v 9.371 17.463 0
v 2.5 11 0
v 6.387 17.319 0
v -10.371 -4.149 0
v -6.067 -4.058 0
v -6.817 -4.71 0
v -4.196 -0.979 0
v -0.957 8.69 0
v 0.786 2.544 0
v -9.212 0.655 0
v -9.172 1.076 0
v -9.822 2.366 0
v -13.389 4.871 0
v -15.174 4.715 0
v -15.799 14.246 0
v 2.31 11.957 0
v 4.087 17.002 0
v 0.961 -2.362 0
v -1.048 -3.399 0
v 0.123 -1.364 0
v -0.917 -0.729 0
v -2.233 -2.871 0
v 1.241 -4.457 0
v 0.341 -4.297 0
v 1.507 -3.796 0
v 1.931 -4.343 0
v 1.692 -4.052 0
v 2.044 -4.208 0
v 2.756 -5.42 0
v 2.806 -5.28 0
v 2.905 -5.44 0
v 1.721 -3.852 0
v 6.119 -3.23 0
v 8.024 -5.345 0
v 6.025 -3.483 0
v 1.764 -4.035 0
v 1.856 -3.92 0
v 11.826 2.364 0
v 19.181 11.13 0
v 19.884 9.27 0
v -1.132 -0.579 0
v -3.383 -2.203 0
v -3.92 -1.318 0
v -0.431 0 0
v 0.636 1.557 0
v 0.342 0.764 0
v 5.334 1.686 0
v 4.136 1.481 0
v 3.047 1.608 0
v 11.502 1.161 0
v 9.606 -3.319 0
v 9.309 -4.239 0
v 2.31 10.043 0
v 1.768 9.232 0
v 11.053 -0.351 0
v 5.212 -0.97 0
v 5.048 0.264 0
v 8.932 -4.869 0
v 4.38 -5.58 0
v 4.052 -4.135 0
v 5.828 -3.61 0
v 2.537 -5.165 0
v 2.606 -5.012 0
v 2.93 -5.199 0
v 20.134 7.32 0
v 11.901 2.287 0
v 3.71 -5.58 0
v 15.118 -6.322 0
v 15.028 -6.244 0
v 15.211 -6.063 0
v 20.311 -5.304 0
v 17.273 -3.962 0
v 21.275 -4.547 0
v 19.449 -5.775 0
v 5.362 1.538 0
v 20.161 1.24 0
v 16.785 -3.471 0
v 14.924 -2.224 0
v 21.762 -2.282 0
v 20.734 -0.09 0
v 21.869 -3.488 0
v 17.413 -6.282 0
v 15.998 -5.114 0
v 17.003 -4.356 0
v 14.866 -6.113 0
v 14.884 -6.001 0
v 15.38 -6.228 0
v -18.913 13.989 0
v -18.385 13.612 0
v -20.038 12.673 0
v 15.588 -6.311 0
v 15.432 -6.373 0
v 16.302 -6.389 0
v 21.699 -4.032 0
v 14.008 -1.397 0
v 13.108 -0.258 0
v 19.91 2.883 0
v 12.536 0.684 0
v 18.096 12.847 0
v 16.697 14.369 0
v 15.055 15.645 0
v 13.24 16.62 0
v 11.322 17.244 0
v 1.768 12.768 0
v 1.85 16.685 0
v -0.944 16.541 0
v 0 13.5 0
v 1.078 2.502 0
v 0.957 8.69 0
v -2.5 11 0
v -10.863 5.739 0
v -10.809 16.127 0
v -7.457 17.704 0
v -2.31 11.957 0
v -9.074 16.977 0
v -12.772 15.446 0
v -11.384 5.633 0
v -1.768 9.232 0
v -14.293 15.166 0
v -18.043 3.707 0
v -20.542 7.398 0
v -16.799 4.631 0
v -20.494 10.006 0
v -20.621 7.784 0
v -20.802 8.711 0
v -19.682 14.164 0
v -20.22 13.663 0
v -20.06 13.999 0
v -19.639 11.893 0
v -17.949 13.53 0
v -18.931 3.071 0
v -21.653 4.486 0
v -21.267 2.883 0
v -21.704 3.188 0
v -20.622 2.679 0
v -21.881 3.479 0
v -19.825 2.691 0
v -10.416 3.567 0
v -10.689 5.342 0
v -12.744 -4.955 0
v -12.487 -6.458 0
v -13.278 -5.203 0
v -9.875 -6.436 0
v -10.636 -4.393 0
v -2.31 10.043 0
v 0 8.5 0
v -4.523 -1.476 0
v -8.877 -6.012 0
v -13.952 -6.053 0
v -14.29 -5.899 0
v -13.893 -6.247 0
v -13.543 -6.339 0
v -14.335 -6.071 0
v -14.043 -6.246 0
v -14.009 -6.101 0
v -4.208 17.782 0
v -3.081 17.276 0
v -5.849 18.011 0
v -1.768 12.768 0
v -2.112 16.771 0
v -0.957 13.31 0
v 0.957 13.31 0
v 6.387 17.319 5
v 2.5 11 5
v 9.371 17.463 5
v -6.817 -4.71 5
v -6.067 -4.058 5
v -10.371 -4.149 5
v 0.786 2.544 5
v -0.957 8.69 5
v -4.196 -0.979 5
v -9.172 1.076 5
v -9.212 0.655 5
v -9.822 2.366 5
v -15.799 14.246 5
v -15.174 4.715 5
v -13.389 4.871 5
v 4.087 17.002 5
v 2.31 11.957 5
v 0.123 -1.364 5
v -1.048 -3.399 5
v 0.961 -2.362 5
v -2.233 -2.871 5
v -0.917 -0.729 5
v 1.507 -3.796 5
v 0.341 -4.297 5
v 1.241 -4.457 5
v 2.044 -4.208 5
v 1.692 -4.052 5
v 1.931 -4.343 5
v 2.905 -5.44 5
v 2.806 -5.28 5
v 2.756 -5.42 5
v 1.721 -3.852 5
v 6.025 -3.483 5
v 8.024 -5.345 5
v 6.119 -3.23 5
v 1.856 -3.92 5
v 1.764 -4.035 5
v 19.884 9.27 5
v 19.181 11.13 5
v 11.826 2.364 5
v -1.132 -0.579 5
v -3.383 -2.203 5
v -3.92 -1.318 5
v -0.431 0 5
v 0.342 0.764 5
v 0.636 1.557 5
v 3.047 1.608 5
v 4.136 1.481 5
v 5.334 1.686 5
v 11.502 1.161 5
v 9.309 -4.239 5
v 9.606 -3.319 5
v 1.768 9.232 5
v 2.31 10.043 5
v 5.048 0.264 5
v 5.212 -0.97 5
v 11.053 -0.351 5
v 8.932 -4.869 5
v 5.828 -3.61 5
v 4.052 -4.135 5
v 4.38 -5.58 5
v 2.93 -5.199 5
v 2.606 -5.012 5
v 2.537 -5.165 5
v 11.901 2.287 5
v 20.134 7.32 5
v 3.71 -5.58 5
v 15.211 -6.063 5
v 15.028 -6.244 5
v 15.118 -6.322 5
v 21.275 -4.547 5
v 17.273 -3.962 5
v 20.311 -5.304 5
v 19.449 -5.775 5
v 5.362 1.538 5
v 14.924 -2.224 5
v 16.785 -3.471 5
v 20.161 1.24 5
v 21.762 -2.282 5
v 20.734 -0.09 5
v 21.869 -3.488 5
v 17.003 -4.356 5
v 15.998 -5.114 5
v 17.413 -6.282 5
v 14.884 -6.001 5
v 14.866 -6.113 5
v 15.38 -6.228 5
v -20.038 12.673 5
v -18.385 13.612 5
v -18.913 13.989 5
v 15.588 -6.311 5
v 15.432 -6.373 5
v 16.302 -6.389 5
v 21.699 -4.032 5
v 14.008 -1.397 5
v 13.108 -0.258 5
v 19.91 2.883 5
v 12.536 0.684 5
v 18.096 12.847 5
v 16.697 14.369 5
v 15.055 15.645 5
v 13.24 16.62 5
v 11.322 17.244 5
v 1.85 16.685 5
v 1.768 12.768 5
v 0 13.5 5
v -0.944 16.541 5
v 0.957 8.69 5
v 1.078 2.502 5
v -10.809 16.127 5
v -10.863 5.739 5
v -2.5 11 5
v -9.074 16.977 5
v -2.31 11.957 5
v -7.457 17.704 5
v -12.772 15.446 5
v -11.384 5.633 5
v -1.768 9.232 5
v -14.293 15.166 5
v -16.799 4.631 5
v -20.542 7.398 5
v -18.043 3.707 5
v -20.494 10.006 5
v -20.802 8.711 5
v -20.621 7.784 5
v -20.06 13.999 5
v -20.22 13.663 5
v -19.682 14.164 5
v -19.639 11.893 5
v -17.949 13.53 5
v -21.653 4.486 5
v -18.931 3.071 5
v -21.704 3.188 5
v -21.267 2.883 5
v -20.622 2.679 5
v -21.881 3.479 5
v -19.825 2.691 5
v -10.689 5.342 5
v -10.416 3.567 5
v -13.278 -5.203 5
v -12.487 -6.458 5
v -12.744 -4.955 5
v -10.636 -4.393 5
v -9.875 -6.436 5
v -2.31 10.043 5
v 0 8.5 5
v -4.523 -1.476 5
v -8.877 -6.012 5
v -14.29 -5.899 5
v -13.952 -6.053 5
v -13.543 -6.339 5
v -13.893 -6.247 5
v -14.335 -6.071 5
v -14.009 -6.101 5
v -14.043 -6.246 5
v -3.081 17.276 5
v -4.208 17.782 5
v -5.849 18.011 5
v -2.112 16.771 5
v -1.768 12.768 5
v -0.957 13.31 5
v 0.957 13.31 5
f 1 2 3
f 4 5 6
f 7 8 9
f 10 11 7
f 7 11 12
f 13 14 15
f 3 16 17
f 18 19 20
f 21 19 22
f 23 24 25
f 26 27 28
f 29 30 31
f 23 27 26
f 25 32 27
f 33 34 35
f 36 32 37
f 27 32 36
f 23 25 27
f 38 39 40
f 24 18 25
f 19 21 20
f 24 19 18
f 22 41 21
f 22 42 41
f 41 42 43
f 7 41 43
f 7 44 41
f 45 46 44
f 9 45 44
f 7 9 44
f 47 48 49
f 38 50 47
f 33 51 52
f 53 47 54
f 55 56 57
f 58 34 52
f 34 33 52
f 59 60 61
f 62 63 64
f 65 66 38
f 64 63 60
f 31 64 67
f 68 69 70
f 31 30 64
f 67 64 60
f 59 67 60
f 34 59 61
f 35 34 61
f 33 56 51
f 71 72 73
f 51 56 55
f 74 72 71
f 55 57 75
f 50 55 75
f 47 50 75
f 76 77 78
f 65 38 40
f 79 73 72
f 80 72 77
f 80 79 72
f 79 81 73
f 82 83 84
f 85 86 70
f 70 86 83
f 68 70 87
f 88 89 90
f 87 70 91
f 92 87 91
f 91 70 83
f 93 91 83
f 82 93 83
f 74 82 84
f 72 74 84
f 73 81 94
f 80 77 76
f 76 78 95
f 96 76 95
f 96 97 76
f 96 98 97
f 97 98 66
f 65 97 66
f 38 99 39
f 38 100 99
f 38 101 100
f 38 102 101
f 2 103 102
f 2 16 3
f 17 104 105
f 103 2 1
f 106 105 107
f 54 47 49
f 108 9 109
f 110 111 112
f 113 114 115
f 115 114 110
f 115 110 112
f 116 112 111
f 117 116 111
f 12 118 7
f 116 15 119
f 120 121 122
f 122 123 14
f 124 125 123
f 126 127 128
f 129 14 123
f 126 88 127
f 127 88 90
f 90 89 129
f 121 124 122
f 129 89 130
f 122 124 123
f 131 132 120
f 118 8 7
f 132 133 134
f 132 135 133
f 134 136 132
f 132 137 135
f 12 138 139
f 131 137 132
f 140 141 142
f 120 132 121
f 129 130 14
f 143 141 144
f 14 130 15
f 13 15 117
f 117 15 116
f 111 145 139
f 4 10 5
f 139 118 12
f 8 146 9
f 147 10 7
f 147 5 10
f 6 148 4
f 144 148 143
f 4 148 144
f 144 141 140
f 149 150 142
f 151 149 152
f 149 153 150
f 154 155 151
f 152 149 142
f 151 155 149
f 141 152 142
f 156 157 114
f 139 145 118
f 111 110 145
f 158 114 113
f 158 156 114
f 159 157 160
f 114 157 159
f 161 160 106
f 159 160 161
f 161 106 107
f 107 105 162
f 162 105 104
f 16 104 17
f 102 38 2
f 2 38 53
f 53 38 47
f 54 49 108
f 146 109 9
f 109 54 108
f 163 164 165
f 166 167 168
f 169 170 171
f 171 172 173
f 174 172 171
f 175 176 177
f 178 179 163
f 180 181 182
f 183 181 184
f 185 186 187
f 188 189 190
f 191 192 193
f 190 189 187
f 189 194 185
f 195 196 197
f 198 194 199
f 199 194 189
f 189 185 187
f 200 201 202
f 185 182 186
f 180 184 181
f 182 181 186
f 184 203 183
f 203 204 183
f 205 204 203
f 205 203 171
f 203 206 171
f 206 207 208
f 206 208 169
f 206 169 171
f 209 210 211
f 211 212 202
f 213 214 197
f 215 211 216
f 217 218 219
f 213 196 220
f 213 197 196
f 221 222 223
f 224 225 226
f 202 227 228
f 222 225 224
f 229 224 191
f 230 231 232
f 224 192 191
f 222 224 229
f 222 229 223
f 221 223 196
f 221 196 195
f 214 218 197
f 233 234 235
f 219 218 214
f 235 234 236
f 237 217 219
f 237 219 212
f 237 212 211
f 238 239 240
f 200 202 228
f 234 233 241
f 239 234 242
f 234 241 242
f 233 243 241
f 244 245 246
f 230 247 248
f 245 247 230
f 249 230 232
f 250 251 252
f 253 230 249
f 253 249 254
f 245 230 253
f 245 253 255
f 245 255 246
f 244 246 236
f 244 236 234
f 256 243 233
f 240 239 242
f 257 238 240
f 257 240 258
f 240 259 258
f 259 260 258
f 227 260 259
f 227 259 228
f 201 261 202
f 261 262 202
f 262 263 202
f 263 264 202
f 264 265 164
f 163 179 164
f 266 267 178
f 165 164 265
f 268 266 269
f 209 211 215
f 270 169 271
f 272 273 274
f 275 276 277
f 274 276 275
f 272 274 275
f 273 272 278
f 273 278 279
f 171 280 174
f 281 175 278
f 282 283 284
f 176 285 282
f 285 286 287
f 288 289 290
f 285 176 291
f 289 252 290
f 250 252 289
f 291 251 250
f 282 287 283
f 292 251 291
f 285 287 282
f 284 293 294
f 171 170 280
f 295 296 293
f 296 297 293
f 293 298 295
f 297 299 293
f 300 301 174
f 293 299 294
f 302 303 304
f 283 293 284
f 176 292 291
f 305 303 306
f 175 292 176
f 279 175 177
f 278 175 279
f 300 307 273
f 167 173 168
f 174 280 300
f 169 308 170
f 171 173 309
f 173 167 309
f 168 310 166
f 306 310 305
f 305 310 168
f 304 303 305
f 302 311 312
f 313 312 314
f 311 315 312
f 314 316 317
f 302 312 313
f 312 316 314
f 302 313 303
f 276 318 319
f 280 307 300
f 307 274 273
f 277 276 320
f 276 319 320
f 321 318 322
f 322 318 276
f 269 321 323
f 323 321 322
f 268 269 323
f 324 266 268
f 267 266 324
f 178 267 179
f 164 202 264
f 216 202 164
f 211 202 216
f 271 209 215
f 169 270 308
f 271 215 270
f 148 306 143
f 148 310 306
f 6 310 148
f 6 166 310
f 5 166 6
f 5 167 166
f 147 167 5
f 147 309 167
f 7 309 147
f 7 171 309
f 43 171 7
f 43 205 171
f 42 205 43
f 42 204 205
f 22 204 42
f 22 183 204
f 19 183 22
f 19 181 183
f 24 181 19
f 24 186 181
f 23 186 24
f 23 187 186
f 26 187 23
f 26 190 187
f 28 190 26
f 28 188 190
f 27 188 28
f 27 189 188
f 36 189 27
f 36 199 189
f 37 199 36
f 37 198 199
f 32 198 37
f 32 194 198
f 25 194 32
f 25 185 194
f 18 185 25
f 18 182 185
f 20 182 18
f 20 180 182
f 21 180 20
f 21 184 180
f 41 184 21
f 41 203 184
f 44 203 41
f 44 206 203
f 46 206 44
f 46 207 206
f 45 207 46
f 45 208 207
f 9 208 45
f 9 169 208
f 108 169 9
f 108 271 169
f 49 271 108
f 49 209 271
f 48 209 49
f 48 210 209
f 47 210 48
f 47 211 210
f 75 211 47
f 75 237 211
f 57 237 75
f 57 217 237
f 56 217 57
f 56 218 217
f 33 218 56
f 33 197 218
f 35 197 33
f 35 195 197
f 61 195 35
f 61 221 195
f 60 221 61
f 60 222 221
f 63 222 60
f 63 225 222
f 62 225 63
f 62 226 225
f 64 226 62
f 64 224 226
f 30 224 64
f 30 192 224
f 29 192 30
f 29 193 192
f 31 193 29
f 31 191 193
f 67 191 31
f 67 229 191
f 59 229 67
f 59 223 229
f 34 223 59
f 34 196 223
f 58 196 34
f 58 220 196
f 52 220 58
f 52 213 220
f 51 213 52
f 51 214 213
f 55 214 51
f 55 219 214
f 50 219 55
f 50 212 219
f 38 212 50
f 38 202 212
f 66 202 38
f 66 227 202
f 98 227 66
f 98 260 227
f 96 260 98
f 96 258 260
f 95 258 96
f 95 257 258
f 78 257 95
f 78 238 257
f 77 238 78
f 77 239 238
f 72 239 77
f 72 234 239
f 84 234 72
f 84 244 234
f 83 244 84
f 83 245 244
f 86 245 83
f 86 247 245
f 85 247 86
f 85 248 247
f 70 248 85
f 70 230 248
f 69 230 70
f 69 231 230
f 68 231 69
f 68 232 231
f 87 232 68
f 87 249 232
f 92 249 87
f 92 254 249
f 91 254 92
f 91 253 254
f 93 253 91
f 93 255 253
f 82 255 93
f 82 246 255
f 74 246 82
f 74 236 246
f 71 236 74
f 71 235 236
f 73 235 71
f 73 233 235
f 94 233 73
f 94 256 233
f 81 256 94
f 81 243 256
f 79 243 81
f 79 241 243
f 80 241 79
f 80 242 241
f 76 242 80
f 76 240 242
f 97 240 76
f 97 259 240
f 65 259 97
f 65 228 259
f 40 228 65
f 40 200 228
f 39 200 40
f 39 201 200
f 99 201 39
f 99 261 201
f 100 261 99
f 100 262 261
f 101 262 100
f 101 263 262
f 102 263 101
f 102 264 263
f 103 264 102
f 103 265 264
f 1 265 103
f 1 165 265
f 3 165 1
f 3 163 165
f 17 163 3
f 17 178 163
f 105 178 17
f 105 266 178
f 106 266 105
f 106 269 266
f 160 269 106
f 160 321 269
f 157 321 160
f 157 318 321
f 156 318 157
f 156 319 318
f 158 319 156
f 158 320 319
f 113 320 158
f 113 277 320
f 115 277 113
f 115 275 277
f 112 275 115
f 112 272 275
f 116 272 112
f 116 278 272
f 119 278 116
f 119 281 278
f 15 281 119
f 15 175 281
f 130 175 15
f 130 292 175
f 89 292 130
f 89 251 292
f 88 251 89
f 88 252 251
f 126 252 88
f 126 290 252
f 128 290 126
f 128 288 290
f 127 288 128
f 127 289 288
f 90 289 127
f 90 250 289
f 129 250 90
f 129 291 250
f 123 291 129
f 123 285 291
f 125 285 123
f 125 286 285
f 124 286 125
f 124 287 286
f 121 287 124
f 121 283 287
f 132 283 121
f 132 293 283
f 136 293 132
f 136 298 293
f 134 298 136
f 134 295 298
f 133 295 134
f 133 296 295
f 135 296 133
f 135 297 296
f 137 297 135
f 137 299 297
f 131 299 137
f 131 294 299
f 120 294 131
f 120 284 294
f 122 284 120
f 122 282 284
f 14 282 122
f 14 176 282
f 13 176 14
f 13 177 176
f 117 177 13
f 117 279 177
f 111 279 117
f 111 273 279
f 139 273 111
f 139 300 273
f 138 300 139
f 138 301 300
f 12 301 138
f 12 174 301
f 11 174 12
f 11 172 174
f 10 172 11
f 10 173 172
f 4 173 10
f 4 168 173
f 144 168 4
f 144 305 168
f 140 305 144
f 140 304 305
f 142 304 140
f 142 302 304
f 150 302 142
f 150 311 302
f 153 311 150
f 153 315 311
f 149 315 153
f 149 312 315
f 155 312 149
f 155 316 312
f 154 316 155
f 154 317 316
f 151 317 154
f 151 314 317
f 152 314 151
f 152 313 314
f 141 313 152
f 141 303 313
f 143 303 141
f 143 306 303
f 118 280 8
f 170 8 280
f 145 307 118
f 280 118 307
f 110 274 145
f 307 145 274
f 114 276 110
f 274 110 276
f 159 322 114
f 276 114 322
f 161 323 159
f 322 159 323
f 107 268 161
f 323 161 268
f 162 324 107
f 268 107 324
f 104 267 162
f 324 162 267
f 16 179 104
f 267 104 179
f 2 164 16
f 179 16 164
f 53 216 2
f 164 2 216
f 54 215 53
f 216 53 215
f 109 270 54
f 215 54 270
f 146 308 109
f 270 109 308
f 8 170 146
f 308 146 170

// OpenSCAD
//Bear by Sergey Demushkin from the Noun Project
//CCBY
//https://thenounproject.com/search/?q=bear&i=539851
//

height_bear = 5;

center_bear_1 = [-0.003373437,3.315047266];
size_bear_1 = [25.106444792,14.041801302];
stroke_width_bear_1 = 0.007000434;
// paths for bear_1
points_bear_1_1 = [ [12.491706771,-4.624470182],[11.902049740,-3.366607943],[11.573102376,-2.603198210],[11.428875521,-1.660872266],[11.557463021,0.885742318],[11.414111047,2.004736548],[11.010821452,3.071969596],[10.387743722,4.057409188],[9.585027344,4.931023047],[8.642821806,5.662778898],[7.601276595,6.222644466],[6.500541199,6.580587476],[5.380765104,6.706575651],[3.668770378,6.623893359],[2.348838542,6.441992318],[1.065121549,6.260091276],[-0.538228646,6.177408984],[-1.208852311,6.309204557],[-1.764803906,6.599154818],[-2.411193392,6.889105078],[-3.353130729,7.020900651],[-4.275881641,6.844423568],[-5.203891146,6.427638672],[-6.199766276,5.939515495],[-7.326114062,5.549023568],[-8.198709896,5.387892318],[-9.063368229,4.860048568],[-10.297120312,4.449415234],[-10.546886979,4.496511068],[-10.849967187,4.712907161],[-11.291159896,4.813217318],[-11.508072754,4.718624642],[-11.600094010,4.525582161],[-11.495682813,3.957554818],[-11.266553646,3.509879818],[-11.757355729,2.427270964],[-11.933832813,1.683990234],[-11.830116146,1.151979297],[-11.785153516,0.930473437],[-12.422584375,-0.740717578],[-12.553222396,-1.318766016],[-12.451969661,-1.485635417],[-12.200797396,-1.660739974],[-11.830959505,-1.777900781],[-11.373709896,-1.770938932],[-10.860422363,-1.552955339],[-10.350731510,-1.187532682],[-9.636720312,-0.657307682],[-8.704626302,-0.609054297],[-7.679861979,-0.519724349],[-6.529519792,-0.082731901],[-6.230424870,-0.021931478],[-6.130461979,-0.249584766],[-5.974237923,-1.267999089],[-5.633342969,-1.957404036],[-5.260123889,-2.697358870],[-5.283266146,-2.939338932],[-5.948164063,-5.695768099],[-6.100076237,-5.835794694],[-7.309974479,-6.158788932],[-7.616428125,-6.300837109],[-8.197122396,-6.700391016],[-8.222820052,-6.799047526],[-8.002918229,-6.788761849],[-8.035991146,-6.816278516],[-8.055206510,-6.899556120],[-7.969051562,-6.899886849],[-7.768497396,-6.952538932],[-7.162204688,-7.020900651],[-5.663538542,-7.008266797],[-5.090649479,-6.764949349],[-3.908524219,-6.018129818],[-3.478133952,-5.643715462],[-2.592288281,-4.162077734],[-2.404599479,-3.876757682],[-2.246378646,-4.071160286],[-1.938139063,-4.579491016],[-1.277871354,-4.962541536],[-0.597759896,-5.265820182],[0.199330469,-5.780997005],[0.715631771,-5.872509766],[1.111448437,-5.807422266],[1.176569010,-5.729998568],[0.974129687,-5.640470182],[1.015933854,-5.630680599],[1.068453646,-5.564435547],[0.990798437,-5.525376432],[0.868296354,-5.493361849],[0.554765104,-4.670772266],[0.073785677,-4.097783984],[-0.522882813,-3.733353516],[-0.645980208,-3.647099349],[-0.244011979,-3.314782682],[0.199917513,-2.876525195],[0.368564583,-2.421350911],[0.454488021,-1.855341016],[0.621799772,-1.879021224],[1.751740104,-2.392180599],[2.376702474,-2.465362695],[3.064552995,-2.347308919],[3.080213021,-2.432397266],[2.900519596,-3.163738672],[2.994421875,-3.871466016],[3.514559635,-5.168354297],[3.461043522,-5.313970215],[3.347971354,-5.386734766],[2.328465625,-5.687797526],[1.498798437,-6.191332682],[1.459309375,-6.279042057],[1.685065104,-6.298488932],[1.613363021,-6.345055599],[1.584788021,-6.425654297],[1.670513021,-6.436601432],[2.132376302,-6.517299349],[2.517179687,-6.517299349],[4.607917187,-6.382361849],[5.129105013,-6.109320117],[5.345443229,-5.747427995],[5.516140820,-5.219939779],[6.346022982,-3.516221549],[6.603669271,-2.648760286],[6.789732332,-1.958616366],[6.833063021,-2.002713932],[7.197295052,-2.922703255],[7.525523079,-3.462978288],[8.041944271,-4.116734766],[8.567452246,-4.591202962],[9.635930697,-5.307173730],[9.915723437,-5.588611849],[9.760942187,-5.814962891],[9.183885937,-6.250070182],[8.544917187,-6.758863932],[8.534499219,-6.823091536],[8.732242188,-6.794582682],[8.627467188,-6.898034766],[8.679060938,-6.943013932],[8.829608854,-6.889303516],[8.858977604,-6.972118099],[8.948671354,-6.936928516],[9.358411719,-6.981543880],[9.996156771,-6.919995182],[11.164259115,-6.629284245],[11.658827376,-6.358615495],[12.212306771,-5.924632682],[12.455392708,-5.629060026],[12.553222396,-5.316818620],[12.491706771,-4.624470182] ];

module polygon_bear_1() {
 render(convexity=4) {
    polygon(points=points_bear_1_1);
 }
}

difference() {
linear_extrude(height=height_bear) {
    difference() { 
    scale(25*1.75/size_bear_1[0]) translate(center_bear_1) polygon_bear_1();
    translate([0,11]) circle(d=5,$fn=16);
    }
}
}
